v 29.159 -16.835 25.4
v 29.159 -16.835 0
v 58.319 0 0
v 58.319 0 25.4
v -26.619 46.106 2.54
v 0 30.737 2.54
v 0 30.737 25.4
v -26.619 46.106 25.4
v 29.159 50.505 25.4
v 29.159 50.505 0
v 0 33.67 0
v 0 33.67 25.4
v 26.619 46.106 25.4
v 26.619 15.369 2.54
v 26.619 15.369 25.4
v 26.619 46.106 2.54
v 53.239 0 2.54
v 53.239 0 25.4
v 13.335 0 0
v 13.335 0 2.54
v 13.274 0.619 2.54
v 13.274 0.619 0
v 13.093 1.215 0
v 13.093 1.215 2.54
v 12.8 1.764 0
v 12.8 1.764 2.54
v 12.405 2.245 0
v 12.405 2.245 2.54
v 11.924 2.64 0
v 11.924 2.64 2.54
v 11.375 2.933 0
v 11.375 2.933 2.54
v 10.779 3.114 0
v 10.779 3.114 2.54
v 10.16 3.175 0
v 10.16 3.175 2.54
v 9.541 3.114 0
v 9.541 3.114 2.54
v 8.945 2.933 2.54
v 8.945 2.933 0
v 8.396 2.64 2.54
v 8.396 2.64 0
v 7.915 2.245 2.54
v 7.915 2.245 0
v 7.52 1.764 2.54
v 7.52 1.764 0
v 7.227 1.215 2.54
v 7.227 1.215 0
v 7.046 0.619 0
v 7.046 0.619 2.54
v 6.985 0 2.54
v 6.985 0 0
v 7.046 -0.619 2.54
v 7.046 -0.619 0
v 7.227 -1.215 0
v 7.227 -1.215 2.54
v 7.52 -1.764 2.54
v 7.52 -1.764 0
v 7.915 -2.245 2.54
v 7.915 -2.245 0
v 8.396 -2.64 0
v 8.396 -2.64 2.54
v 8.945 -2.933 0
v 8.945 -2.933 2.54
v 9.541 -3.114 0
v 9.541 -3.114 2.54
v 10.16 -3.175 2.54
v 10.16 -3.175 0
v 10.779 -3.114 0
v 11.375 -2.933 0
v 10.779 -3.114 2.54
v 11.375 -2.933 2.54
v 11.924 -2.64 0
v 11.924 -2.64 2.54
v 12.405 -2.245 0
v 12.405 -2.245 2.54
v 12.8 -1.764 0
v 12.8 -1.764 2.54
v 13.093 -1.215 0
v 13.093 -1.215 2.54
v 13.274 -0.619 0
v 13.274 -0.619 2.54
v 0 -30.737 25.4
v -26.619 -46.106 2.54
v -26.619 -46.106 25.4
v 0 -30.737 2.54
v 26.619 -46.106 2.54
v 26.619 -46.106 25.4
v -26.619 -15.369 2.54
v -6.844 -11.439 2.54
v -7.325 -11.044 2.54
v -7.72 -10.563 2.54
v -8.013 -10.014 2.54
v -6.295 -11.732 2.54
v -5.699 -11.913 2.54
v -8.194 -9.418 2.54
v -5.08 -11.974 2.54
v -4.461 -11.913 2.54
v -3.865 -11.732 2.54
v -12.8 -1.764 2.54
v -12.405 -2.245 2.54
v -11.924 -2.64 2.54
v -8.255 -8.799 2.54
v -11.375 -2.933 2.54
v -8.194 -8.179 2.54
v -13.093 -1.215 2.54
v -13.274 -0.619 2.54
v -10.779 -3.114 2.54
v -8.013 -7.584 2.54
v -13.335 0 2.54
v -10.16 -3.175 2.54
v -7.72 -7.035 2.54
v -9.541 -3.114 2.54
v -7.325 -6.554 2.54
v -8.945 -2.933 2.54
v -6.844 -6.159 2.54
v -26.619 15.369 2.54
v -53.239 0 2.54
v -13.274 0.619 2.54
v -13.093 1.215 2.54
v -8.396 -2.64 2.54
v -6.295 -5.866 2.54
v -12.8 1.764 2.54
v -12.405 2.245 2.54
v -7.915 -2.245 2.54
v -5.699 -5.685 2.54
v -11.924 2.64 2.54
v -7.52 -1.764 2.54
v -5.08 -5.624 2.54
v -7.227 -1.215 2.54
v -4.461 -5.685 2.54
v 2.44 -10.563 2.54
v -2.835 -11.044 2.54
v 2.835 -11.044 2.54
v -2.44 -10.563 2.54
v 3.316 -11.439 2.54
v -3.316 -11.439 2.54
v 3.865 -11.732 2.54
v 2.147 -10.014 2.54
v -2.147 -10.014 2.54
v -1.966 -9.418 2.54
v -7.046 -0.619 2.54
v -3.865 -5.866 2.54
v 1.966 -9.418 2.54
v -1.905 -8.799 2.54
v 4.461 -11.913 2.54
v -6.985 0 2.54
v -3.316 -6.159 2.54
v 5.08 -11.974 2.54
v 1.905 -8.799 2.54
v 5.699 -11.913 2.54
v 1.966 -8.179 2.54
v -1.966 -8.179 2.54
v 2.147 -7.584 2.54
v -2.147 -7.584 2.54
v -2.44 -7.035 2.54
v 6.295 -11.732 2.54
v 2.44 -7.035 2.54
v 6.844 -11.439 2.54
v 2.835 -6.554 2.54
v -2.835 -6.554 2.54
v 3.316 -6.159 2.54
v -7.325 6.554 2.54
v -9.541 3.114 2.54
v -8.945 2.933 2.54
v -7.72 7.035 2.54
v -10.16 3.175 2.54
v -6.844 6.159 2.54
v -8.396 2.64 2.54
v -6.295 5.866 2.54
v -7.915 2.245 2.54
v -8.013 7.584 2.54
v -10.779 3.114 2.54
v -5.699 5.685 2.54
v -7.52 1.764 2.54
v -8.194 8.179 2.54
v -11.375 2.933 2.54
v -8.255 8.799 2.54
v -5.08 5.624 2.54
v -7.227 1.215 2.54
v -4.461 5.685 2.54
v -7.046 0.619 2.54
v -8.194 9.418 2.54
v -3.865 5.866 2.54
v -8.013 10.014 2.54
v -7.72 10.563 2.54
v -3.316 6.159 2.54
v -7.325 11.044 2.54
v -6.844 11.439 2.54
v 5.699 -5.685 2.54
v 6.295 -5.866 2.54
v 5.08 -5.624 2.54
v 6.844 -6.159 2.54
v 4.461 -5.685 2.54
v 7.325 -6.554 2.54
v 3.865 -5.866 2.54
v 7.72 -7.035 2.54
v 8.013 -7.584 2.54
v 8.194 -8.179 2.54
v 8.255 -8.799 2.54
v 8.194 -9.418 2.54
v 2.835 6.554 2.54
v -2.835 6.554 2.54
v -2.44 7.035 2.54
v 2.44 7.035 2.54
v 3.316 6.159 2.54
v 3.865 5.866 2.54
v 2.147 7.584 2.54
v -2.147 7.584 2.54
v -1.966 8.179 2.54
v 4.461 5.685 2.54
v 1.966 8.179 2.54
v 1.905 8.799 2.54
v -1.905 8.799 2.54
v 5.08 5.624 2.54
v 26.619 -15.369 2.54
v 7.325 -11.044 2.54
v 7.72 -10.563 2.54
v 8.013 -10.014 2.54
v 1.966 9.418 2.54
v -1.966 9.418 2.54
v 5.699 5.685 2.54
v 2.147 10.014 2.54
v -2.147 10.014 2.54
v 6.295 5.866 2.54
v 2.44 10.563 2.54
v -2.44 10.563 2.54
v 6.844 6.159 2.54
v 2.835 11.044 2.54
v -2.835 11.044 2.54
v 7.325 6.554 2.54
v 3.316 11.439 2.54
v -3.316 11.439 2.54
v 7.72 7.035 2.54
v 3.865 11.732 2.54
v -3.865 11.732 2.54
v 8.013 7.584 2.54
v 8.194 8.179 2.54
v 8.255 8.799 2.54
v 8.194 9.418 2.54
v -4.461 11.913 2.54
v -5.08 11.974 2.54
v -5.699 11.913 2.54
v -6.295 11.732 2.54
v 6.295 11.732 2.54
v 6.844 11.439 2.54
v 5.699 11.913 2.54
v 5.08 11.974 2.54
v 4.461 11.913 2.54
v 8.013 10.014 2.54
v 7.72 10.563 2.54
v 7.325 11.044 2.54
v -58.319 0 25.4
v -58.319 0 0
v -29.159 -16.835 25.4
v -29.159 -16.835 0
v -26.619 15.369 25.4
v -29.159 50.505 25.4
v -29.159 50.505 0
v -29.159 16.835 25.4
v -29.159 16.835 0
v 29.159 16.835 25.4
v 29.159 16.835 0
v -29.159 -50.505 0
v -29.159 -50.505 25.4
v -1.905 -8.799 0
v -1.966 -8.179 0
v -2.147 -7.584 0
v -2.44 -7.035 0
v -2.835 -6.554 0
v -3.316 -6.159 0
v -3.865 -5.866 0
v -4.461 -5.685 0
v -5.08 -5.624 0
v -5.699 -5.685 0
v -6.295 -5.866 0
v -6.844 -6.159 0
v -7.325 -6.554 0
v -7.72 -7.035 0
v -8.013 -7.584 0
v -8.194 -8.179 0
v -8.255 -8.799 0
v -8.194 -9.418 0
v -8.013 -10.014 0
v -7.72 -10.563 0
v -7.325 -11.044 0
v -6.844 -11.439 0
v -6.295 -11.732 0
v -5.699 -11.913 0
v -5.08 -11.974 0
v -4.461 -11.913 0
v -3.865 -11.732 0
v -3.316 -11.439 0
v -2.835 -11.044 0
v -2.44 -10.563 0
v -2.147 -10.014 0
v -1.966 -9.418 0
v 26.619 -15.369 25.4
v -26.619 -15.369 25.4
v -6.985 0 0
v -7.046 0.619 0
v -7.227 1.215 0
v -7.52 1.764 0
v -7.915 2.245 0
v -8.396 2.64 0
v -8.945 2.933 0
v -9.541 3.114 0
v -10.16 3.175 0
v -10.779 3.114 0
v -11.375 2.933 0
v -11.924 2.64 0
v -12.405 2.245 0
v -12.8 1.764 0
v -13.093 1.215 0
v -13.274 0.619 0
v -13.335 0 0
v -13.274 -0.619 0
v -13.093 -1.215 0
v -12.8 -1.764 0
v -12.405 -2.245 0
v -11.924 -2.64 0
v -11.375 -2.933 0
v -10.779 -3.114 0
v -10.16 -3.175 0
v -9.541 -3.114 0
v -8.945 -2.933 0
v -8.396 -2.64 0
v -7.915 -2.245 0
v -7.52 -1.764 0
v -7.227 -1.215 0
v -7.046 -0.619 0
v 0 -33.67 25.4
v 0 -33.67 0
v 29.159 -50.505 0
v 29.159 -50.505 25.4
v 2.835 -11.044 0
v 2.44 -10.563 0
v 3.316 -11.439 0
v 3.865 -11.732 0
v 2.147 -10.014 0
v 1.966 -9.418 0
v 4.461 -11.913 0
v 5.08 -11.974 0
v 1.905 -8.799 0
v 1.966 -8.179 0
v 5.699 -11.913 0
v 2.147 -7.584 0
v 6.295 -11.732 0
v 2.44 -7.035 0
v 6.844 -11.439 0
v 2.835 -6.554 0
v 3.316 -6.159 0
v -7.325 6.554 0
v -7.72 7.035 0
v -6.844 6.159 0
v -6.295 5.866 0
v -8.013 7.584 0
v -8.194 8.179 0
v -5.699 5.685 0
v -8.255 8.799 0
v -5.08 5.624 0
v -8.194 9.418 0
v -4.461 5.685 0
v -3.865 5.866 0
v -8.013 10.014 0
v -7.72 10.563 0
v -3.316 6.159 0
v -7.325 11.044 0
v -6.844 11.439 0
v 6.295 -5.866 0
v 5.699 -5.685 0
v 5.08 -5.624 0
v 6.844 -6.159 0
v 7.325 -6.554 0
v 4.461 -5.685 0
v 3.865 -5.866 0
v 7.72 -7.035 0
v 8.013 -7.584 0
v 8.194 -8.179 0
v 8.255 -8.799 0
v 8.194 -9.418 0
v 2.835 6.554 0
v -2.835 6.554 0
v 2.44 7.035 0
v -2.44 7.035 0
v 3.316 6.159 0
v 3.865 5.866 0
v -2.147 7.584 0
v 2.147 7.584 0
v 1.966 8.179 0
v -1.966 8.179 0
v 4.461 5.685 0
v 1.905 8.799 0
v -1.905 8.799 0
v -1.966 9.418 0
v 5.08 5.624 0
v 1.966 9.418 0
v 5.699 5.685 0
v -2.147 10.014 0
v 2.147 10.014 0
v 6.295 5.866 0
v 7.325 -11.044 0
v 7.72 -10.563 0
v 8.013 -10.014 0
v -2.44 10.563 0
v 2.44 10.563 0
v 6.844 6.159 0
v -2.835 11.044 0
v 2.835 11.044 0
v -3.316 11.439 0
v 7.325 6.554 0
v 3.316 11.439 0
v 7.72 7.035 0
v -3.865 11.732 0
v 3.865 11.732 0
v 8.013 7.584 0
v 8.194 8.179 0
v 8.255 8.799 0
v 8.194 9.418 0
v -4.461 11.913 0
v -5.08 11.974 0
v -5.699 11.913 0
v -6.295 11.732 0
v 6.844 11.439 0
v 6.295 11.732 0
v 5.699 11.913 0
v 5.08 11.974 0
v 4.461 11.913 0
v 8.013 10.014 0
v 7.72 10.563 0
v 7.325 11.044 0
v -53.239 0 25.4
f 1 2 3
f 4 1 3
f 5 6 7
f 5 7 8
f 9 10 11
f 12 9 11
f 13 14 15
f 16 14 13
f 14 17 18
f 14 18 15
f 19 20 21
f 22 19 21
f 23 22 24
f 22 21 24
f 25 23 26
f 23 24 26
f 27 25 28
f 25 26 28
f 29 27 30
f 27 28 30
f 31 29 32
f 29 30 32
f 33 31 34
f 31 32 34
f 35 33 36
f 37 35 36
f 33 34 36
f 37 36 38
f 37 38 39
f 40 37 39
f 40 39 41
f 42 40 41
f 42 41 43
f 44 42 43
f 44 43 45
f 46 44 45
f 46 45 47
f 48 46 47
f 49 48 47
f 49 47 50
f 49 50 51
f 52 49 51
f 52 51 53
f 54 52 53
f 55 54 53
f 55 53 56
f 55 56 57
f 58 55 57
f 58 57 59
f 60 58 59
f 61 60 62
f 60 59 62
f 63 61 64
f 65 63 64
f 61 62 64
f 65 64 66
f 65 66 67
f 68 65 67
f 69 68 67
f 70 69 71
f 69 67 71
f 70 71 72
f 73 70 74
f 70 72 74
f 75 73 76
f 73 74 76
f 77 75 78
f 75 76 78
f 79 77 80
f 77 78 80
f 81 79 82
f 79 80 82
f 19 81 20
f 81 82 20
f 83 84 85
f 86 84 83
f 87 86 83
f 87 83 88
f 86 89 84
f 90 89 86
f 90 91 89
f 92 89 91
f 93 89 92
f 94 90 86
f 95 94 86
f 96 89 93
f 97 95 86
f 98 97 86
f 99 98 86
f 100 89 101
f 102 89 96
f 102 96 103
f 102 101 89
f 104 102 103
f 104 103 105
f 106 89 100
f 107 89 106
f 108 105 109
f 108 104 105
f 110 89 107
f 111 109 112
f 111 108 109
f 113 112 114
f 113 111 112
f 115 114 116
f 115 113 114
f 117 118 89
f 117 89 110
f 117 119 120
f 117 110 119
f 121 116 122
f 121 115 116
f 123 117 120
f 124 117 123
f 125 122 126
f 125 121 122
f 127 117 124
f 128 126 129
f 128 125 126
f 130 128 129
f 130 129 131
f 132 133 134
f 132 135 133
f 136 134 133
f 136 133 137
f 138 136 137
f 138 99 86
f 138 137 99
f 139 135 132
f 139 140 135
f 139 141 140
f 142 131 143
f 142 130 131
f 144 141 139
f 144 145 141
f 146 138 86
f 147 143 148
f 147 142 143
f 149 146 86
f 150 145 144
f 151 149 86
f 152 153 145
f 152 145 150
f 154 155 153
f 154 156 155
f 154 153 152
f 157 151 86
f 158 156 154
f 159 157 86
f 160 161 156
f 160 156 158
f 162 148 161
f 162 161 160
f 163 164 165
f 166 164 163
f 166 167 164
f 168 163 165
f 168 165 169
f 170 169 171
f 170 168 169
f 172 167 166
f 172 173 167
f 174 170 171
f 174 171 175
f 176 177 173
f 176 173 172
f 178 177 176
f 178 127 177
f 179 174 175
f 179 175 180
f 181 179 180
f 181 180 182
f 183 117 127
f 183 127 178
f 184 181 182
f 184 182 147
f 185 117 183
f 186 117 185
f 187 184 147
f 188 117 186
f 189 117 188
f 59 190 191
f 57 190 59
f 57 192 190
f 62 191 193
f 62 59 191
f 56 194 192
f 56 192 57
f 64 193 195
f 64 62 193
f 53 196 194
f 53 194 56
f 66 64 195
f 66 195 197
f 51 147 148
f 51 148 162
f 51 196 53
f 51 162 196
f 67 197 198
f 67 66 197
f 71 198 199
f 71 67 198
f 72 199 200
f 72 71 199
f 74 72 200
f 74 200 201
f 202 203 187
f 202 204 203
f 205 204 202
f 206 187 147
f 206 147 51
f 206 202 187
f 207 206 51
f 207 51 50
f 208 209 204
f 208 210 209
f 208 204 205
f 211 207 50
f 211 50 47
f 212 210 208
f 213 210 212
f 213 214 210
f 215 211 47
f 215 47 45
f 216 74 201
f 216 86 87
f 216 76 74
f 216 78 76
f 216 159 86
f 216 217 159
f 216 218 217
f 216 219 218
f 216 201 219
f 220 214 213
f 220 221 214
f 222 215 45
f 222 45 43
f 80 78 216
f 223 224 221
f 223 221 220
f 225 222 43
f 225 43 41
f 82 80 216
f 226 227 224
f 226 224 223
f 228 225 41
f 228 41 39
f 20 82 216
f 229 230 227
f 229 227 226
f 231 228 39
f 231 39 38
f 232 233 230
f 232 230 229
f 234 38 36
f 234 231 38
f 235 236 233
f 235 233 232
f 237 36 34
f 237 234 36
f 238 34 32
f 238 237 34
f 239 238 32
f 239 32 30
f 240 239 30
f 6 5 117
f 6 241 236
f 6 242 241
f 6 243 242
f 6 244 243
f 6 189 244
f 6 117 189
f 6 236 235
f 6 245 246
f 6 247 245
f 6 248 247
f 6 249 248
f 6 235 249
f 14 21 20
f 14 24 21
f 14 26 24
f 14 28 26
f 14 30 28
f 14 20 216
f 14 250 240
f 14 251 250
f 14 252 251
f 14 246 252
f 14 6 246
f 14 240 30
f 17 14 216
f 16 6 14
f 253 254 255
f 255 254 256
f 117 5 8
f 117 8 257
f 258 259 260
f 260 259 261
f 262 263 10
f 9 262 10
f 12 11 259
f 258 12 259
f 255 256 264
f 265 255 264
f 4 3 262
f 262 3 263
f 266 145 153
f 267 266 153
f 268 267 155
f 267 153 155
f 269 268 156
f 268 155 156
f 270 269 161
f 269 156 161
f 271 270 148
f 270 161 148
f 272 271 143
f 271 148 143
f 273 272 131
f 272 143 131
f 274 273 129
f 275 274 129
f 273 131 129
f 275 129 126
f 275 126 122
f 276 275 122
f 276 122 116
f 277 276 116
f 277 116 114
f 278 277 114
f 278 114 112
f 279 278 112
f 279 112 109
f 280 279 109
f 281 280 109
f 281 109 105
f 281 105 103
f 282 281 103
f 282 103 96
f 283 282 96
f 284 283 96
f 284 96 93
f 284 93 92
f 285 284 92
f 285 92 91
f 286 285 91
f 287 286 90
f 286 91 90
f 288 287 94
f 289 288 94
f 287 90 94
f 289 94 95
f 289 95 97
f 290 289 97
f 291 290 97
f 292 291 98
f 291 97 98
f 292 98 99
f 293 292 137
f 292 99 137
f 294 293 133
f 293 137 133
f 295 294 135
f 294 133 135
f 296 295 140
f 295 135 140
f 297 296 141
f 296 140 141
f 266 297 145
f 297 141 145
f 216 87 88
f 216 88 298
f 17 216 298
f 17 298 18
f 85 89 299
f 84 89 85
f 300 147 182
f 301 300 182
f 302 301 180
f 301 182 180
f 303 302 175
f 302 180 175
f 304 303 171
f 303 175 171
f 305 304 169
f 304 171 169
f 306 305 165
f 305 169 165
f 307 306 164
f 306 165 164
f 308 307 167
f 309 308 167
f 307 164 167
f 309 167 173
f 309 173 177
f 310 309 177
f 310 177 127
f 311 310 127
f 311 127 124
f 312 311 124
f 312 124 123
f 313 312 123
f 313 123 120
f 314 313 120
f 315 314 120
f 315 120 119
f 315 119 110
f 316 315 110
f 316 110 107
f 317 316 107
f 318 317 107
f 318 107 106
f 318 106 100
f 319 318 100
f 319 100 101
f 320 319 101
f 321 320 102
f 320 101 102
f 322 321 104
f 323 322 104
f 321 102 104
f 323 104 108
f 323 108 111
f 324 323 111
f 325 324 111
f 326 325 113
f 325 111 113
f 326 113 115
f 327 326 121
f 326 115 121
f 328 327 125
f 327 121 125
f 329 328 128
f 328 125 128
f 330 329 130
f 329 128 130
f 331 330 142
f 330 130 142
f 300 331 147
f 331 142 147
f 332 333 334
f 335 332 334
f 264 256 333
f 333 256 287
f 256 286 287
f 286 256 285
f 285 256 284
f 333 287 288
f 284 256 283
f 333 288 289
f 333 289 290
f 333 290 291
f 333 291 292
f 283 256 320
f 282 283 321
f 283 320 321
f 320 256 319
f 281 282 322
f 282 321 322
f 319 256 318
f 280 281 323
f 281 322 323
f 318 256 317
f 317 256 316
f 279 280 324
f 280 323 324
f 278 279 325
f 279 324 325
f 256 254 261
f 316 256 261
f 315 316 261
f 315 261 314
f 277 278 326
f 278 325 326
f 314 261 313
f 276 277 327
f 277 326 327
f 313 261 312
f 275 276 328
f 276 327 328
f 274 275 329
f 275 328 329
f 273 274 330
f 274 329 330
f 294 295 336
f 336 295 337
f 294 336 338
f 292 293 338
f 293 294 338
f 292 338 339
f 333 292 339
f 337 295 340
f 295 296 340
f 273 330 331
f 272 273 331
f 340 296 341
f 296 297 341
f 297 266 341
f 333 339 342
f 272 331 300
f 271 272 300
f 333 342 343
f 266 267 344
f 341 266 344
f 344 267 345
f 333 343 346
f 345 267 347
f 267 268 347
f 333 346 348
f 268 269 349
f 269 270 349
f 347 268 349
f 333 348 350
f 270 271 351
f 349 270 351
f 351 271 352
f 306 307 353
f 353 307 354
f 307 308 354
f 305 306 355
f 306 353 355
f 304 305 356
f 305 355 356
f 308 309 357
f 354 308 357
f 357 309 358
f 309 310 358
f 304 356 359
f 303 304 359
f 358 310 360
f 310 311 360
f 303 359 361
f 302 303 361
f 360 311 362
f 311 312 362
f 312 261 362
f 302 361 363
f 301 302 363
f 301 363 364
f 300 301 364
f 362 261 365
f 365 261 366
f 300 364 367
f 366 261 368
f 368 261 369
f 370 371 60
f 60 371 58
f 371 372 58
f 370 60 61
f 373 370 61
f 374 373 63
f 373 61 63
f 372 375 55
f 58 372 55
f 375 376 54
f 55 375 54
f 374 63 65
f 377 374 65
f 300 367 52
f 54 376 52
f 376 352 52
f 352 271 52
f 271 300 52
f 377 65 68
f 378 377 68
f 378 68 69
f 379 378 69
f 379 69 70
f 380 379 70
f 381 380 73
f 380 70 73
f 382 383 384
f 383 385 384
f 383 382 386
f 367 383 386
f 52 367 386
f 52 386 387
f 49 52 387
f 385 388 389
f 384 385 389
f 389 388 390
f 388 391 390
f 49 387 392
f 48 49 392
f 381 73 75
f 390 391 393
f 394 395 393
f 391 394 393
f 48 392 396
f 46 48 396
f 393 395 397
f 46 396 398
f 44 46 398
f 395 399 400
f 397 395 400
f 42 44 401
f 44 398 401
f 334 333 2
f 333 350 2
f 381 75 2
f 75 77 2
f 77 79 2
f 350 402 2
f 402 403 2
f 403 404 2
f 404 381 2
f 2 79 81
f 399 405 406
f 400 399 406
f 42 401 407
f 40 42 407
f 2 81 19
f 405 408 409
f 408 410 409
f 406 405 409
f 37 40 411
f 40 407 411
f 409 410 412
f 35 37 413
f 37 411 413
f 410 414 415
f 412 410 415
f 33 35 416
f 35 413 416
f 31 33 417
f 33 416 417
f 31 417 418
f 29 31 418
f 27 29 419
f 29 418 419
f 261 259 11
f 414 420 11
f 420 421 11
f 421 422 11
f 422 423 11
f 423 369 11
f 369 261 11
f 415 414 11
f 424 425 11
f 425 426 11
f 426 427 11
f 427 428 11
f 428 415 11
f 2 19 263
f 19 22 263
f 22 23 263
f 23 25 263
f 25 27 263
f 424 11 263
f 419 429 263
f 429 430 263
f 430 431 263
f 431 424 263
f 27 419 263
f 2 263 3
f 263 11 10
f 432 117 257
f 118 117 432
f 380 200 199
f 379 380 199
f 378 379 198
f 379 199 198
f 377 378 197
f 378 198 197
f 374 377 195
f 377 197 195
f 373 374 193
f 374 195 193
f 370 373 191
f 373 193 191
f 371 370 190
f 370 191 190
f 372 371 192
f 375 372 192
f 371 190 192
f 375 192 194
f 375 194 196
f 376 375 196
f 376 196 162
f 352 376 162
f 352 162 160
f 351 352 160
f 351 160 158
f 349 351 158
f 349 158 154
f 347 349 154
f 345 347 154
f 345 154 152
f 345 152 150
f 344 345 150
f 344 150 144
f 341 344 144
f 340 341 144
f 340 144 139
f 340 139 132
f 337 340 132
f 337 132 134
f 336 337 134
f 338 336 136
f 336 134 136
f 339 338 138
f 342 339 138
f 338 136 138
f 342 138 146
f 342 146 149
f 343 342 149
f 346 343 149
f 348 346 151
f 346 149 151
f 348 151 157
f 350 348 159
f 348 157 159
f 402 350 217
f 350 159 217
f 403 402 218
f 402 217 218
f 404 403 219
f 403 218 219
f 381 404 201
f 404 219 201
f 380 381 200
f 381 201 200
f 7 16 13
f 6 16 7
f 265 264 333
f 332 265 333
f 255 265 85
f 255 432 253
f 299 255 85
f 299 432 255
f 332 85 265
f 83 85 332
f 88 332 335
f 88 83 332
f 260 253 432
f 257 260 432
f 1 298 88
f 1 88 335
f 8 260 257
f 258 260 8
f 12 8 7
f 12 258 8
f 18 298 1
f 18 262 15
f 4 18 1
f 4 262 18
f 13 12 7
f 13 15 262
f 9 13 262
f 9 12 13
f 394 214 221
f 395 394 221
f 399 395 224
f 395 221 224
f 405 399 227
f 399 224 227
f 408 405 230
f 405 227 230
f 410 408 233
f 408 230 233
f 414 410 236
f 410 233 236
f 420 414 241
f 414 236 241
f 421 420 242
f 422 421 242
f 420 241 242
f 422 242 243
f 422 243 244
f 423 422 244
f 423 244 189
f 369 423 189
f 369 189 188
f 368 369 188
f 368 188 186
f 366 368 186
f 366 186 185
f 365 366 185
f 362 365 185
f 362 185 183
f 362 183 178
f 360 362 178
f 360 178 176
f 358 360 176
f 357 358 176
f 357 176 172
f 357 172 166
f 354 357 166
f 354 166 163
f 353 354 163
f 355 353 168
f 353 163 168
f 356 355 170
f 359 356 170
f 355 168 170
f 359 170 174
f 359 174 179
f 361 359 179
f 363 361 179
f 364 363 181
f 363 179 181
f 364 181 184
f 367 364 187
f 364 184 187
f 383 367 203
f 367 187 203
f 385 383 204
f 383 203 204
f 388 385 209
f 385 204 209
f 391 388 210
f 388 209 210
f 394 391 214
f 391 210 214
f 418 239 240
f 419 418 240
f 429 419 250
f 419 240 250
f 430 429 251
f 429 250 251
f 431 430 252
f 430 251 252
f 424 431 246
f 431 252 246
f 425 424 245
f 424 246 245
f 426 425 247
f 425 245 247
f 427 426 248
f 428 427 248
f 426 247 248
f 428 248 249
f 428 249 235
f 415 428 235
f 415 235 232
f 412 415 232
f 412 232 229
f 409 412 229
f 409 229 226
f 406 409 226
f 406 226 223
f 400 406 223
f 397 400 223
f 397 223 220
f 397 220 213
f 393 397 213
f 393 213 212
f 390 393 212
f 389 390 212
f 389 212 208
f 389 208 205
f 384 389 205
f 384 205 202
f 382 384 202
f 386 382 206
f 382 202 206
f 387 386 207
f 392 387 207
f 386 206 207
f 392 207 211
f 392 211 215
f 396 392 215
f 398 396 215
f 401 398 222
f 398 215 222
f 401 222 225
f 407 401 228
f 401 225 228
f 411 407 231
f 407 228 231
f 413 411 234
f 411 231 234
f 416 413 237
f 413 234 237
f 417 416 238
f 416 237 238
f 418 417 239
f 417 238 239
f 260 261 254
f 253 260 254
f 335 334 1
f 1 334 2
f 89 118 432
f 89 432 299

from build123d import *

# Parameters (mm, degrees)
F1_DEPTH = 25.4
F2_T     = -2.54
F3_R     = 3.175
F4_DEPTH = 25.4


with BuildPart() as f1:
    # F0 (on Top) → F1 (new body)
    with BuildSketch(Plane.XY):
        Polygon((-58.3186791779, 0), (-29.159339589, -16.8351525611), (-29.159339589, -50.5054576833), (0, -33.6703051222), (29.159339589, -50.5054576833), (29.159339589, -16.8351525611), (58.3186791779, 0), (29.159339589, 16.8351525611), (29.159339589, 50.5054576833), (0, 33.6703051222), (-29.159339589, 50.5054576833), (-29.159339589, 16.8351525611), align=None)
    extrude(amount=F1_DEPTH)

    # F2
    f2_openings = [f1.faces().sort_by_distance(p)[0] for p in [
        (0, 0, 25.4),
    ]]
    offset(amount=F2_T, openings=f2_openings, kind=Kind.INTERSECTION)

    # F3 (on face) → F4 (cut)
    with BuildSketch(Plane.XY.offset(2.54)):
        with Locations((5.08, 8.7988181024)):
            Circle(F3_R)
        with Locations((10.16, 0)):
            Circle(F3_R)
        with Locations((5.08, -8.7988181024)):
            Circle(F3_R)
        with Locations((-5.08, -8.7988181024)):
            Circle(F3_R)
        with Locations((-10.16, 0)):
            Circle(F3_R)
        with Locations((-5.08, 8.7988181024)):
            Circle(F3_R)
    extrude(amount=-F4_DEPTH, mode=Mode.SUBTRACT)


solid = f1.part
